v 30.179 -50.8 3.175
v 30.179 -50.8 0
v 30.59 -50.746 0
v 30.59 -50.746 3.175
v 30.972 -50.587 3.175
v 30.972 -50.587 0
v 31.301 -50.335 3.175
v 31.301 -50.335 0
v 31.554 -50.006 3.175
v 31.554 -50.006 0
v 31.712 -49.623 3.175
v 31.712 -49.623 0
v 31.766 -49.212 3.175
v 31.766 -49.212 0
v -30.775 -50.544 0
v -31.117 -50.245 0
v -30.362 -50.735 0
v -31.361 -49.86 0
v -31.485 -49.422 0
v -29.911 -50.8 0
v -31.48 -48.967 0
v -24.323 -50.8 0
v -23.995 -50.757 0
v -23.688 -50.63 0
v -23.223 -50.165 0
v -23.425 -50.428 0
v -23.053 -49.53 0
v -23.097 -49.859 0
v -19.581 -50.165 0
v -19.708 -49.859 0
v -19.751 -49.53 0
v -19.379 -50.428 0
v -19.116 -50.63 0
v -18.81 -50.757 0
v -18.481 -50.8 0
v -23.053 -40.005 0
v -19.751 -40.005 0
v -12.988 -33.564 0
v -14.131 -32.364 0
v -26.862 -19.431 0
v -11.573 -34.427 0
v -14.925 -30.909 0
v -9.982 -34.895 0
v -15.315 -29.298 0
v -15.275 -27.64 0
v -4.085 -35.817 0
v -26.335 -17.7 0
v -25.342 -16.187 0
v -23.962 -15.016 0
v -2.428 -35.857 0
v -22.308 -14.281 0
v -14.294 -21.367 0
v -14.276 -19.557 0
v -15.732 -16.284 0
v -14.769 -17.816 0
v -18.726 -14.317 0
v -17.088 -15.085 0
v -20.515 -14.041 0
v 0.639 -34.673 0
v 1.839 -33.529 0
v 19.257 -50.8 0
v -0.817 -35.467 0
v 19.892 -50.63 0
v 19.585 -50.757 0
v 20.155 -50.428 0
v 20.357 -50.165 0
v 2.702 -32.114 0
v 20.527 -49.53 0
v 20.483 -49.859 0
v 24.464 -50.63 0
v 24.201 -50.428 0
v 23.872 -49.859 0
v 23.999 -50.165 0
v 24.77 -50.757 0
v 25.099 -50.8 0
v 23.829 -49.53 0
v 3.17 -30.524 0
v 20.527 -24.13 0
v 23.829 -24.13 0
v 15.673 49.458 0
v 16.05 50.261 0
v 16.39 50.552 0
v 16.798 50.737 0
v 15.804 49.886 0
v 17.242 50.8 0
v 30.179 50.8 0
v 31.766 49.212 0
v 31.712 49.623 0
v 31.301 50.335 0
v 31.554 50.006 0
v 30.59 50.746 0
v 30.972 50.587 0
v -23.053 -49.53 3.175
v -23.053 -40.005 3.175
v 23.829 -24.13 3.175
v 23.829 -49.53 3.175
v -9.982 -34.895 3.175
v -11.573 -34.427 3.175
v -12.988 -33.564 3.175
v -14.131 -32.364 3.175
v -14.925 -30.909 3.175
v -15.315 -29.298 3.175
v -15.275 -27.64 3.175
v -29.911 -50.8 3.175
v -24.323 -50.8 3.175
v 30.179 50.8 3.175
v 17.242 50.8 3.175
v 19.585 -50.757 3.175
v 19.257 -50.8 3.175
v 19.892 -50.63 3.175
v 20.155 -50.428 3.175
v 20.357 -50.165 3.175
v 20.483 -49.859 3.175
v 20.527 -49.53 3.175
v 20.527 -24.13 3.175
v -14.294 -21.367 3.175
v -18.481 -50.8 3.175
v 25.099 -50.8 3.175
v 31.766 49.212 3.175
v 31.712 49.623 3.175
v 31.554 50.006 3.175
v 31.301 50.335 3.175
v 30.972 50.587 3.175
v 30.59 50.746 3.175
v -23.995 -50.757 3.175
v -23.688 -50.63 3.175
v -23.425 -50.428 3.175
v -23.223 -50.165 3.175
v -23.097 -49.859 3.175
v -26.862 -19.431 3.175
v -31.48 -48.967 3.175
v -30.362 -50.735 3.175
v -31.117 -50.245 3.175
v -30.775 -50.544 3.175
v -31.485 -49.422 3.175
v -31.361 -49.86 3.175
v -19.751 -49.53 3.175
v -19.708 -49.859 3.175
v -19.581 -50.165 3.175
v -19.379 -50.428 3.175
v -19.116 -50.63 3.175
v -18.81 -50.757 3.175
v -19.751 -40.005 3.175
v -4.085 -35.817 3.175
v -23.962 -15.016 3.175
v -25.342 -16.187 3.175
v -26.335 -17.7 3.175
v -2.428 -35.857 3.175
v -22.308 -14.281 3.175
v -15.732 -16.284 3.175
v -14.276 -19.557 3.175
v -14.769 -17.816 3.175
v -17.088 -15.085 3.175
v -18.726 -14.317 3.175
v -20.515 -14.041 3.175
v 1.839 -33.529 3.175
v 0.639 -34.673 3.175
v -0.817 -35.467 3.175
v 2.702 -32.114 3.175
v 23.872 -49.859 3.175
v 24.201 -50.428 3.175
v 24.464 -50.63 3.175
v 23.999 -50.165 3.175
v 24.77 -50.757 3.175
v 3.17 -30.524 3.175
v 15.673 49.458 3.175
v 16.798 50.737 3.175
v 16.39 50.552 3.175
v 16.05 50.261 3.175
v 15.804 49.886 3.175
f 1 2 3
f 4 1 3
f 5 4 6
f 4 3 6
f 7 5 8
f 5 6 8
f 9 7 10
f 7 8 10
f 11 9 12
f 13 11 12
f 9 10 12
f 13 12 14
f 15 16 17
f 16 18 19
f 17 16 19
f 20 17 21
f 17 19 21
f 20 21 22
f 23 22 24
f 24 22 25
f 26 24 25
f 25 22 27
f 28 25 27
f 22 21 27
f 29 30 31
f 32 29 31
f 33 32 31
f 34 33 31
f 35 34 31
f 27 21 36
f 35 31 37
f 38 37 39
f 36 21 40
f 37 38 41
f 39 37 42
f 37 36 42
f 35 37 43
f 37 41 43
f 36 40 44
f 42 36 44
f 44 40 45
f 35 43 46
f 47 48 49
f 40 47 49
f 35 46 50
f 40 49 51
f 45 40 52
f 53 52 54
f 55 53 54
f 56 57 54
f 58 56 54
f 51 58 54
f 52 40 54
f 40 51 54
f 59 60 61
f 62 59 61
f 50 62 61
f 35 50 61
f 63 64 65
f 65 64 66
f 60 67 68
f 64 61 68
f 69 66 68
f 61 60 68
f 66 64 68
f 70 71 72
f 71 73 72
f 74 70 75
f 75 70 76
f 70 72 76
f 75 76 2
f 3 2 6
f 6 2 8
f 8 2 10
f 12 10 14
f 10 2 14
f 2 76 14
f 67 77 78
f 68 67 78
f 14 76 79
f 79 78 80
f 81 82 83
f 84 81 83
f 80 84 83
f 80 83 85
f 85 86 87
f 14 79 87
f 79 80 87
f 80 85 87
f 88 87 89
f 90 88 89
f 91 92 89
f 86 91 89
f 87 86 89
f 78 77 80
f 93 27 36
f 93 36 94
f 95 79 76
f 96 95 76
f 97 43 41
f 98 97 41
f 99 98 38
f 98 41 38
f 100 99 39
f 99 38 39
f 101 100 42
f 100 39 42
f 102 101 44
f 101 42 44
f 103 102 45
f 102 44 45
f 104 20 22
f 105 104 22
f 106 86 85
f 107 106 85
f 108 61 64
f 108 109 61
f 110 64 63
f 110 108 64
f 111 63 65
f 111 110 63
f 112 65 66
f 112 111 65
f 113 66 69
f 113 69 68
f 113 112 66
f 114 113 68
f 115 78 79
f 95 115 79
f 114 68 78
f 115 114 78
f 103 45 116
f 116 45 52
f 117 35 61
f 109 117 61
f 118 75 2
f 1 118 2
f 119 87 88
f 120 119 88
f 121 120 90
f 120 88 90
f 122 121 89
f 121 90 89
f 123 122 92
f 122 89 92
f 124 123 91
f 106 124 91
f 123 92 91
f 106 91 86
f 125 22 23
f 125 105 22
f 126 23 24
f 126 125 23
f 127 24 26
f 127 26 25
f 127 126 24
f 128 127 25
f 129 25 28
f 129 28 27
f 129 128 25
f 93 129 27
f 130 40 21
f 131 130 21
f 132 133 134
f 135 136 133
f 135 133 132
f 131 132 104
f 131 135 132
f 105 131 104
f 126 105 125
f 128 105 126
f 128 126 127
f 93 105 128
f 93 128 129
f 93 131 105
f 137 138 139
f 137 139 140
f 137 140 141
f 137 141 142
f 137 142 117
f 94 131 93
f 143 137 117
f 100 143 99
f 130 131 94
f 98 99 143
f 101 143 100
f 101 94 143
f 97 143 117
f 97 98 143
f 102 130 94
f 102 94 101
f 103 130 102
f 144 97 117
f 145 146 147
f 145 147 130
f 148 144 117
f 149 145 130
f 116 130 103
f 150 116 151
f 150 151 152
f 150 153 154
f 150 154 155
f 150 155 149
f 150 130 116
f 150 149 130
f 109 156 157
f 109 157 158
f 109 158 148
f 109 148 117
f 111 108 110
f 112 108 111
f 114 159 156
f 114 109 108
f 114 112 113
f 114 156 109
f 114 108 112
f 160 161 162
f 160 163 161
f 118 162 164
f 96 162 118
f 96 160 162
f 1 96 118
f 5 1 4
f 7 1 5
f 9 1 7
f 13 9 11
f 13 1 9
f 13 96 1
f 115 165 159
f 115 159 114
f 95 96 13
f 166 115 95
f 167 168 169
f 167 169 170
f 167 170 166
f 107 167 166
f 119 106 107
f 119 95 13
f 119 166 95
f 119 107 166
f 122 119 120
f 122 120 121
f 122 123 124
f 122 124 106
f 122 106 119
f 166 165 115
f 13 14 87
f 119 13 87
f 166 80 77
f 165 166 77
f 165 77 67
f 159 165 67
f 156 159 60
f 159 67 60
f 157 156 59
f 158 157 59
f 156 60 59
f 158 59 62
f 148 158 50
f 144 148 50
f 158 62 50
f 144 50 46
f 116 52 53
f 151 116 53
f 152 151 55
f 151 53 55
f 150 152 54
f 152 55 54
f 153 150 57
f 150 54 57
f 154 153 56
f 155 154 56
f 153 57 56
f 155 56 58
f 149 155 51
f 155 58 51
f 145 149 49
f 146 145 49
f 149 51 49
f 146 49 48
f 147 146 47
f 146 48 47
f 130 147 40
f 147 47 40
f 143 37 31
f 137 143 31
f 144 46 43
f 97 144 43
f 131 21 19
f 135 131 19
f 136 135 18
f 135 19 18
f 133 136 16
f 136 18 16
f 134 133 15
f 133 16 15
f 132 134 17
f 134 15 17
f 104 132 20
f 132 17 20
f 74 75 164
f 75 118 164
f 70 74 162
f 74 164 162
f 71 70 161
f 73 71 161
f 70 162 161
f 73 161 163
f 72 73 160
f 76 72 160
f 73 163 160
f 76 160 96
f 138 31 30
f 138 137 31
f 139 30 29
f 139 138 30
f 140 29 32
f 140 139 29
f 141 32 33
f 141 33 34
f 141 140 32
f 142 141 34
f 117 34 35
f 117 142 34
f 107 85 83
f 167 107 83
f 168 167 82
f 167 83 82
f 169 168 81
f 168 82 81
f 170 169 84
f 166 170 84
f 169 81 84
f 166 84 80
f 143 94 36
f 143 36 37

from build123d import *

# Parameters (mm, degrees)
F1_DEPTH  = 3.175
F2_R      = 1.27
F1_FACE_W = 3.302
F1_FACE_H = 3.175
F3_DEPTH  = 1.143


with BuildPart() as f1:
    # F0 (on Top) → F1 (new body)
    with BuildSketch(Plane.XY):
        with BuildLine():
            Line((23.828722, -50.8), (30.178722, -50.8))
            ThreePointArc((30.178722, -50.8), (31.301254, -50.335032), (31.766222, -49.2125))
            Line((31.766222, -49.2125), (31.766222, 49.2125))
            ThreePointArc((31.766222, 49.2125), (31.301254, 50.335032), (30.178722, 50.8))
            Line((30.178722, 50.8), (17.241719, 50.8))
            ThreePointArc((17.241719, 50.8), (16.209511, 50.41861), (15.673269, 49.457696))
            Line((15.673269, 49.457696), (3.169756, -30.523921))
            Line((3.169756, -30.523921), (2.188974, -36.797721))
            Line((2.188974, -36.797721), (-4.084826, -35.816939))
            Line((-4.084826, -35.816939), (-9.982198, -34.895004))
            ThreePointArc((-9.982198, -34.895004), (-14.13118, -32.363933), (-15.275216, -27.640422))
            Line((-15.275216, -27.640422), (-14.294434, -21.366622))
            ThreePointArc((-14.294434, -21.366622), (-19.610562, -14.114872), (-26.862312, -19.431))
            Line((-26.862312, -19.431), (-31.479717, -48.967304))
            ThreePointArc((-31.479717, -48.967304), (-31.117378, -50.244708), (-29.911267, -50.8))
            Line((-29.911267, -50.8), (-23.053267, -50.8))
            Line((-23.053267, -50.8), (-23.053267, -41.148))
            Line((-23.053267, -41.148), (-19.751267, -41.148))
            Line((-19.751267, -41.148), (-19.751267, -50.8))
            Line((-19.751267, -50.8), (0, -50.8))
            Line((0, -50.8), (20.526722, -50.8))
            Line((20.526722, -50.8), (20.526722, -24.13))
            Line((20.526722, -24.13), (23.828722, -24.13))
            Line((23.828722, -24.13), (23.828722, -50.8))
        make_face()
        with BuildLine():
            Line((2.188974, -36.797721), (3.169756, -30.523921))
            ThreePointArc((3.169756, -30.523921), (0.638685, -34.672903), (-4.084826, -35.816939))
            Line((-4.084826, -35.816939), (2.188974, -36.797721))
        make_face()
    extrude(amount=F1_DEPTH)

    # F2
    f2_edges = [f1.edges().sort_by_distance(p)[0] for p in [
        (23.828722, -50.8, 1.5875),
        (-19.751267, -50.8, 1.5875),
        (20.526722, -50.8, 1.5875),
        (-23.053267, -50.8, 1.5875),
    ]]
    fillet(f2_edges, radius=F2_R)

    # F1_face (on face) → F3 (cut)
    with BuildSketch(Plane(origin=(-21.402267, -41.148, 1.5875), x_dir=(1, 0, 0), z_dir=(0, -1, 0))):
        Rectangle(F1_FACE_W, F1_FACE_H)
    extrude(amount=-F3_DEPTH, mode=Mode.SUBTRACT)


solid = f1.part
